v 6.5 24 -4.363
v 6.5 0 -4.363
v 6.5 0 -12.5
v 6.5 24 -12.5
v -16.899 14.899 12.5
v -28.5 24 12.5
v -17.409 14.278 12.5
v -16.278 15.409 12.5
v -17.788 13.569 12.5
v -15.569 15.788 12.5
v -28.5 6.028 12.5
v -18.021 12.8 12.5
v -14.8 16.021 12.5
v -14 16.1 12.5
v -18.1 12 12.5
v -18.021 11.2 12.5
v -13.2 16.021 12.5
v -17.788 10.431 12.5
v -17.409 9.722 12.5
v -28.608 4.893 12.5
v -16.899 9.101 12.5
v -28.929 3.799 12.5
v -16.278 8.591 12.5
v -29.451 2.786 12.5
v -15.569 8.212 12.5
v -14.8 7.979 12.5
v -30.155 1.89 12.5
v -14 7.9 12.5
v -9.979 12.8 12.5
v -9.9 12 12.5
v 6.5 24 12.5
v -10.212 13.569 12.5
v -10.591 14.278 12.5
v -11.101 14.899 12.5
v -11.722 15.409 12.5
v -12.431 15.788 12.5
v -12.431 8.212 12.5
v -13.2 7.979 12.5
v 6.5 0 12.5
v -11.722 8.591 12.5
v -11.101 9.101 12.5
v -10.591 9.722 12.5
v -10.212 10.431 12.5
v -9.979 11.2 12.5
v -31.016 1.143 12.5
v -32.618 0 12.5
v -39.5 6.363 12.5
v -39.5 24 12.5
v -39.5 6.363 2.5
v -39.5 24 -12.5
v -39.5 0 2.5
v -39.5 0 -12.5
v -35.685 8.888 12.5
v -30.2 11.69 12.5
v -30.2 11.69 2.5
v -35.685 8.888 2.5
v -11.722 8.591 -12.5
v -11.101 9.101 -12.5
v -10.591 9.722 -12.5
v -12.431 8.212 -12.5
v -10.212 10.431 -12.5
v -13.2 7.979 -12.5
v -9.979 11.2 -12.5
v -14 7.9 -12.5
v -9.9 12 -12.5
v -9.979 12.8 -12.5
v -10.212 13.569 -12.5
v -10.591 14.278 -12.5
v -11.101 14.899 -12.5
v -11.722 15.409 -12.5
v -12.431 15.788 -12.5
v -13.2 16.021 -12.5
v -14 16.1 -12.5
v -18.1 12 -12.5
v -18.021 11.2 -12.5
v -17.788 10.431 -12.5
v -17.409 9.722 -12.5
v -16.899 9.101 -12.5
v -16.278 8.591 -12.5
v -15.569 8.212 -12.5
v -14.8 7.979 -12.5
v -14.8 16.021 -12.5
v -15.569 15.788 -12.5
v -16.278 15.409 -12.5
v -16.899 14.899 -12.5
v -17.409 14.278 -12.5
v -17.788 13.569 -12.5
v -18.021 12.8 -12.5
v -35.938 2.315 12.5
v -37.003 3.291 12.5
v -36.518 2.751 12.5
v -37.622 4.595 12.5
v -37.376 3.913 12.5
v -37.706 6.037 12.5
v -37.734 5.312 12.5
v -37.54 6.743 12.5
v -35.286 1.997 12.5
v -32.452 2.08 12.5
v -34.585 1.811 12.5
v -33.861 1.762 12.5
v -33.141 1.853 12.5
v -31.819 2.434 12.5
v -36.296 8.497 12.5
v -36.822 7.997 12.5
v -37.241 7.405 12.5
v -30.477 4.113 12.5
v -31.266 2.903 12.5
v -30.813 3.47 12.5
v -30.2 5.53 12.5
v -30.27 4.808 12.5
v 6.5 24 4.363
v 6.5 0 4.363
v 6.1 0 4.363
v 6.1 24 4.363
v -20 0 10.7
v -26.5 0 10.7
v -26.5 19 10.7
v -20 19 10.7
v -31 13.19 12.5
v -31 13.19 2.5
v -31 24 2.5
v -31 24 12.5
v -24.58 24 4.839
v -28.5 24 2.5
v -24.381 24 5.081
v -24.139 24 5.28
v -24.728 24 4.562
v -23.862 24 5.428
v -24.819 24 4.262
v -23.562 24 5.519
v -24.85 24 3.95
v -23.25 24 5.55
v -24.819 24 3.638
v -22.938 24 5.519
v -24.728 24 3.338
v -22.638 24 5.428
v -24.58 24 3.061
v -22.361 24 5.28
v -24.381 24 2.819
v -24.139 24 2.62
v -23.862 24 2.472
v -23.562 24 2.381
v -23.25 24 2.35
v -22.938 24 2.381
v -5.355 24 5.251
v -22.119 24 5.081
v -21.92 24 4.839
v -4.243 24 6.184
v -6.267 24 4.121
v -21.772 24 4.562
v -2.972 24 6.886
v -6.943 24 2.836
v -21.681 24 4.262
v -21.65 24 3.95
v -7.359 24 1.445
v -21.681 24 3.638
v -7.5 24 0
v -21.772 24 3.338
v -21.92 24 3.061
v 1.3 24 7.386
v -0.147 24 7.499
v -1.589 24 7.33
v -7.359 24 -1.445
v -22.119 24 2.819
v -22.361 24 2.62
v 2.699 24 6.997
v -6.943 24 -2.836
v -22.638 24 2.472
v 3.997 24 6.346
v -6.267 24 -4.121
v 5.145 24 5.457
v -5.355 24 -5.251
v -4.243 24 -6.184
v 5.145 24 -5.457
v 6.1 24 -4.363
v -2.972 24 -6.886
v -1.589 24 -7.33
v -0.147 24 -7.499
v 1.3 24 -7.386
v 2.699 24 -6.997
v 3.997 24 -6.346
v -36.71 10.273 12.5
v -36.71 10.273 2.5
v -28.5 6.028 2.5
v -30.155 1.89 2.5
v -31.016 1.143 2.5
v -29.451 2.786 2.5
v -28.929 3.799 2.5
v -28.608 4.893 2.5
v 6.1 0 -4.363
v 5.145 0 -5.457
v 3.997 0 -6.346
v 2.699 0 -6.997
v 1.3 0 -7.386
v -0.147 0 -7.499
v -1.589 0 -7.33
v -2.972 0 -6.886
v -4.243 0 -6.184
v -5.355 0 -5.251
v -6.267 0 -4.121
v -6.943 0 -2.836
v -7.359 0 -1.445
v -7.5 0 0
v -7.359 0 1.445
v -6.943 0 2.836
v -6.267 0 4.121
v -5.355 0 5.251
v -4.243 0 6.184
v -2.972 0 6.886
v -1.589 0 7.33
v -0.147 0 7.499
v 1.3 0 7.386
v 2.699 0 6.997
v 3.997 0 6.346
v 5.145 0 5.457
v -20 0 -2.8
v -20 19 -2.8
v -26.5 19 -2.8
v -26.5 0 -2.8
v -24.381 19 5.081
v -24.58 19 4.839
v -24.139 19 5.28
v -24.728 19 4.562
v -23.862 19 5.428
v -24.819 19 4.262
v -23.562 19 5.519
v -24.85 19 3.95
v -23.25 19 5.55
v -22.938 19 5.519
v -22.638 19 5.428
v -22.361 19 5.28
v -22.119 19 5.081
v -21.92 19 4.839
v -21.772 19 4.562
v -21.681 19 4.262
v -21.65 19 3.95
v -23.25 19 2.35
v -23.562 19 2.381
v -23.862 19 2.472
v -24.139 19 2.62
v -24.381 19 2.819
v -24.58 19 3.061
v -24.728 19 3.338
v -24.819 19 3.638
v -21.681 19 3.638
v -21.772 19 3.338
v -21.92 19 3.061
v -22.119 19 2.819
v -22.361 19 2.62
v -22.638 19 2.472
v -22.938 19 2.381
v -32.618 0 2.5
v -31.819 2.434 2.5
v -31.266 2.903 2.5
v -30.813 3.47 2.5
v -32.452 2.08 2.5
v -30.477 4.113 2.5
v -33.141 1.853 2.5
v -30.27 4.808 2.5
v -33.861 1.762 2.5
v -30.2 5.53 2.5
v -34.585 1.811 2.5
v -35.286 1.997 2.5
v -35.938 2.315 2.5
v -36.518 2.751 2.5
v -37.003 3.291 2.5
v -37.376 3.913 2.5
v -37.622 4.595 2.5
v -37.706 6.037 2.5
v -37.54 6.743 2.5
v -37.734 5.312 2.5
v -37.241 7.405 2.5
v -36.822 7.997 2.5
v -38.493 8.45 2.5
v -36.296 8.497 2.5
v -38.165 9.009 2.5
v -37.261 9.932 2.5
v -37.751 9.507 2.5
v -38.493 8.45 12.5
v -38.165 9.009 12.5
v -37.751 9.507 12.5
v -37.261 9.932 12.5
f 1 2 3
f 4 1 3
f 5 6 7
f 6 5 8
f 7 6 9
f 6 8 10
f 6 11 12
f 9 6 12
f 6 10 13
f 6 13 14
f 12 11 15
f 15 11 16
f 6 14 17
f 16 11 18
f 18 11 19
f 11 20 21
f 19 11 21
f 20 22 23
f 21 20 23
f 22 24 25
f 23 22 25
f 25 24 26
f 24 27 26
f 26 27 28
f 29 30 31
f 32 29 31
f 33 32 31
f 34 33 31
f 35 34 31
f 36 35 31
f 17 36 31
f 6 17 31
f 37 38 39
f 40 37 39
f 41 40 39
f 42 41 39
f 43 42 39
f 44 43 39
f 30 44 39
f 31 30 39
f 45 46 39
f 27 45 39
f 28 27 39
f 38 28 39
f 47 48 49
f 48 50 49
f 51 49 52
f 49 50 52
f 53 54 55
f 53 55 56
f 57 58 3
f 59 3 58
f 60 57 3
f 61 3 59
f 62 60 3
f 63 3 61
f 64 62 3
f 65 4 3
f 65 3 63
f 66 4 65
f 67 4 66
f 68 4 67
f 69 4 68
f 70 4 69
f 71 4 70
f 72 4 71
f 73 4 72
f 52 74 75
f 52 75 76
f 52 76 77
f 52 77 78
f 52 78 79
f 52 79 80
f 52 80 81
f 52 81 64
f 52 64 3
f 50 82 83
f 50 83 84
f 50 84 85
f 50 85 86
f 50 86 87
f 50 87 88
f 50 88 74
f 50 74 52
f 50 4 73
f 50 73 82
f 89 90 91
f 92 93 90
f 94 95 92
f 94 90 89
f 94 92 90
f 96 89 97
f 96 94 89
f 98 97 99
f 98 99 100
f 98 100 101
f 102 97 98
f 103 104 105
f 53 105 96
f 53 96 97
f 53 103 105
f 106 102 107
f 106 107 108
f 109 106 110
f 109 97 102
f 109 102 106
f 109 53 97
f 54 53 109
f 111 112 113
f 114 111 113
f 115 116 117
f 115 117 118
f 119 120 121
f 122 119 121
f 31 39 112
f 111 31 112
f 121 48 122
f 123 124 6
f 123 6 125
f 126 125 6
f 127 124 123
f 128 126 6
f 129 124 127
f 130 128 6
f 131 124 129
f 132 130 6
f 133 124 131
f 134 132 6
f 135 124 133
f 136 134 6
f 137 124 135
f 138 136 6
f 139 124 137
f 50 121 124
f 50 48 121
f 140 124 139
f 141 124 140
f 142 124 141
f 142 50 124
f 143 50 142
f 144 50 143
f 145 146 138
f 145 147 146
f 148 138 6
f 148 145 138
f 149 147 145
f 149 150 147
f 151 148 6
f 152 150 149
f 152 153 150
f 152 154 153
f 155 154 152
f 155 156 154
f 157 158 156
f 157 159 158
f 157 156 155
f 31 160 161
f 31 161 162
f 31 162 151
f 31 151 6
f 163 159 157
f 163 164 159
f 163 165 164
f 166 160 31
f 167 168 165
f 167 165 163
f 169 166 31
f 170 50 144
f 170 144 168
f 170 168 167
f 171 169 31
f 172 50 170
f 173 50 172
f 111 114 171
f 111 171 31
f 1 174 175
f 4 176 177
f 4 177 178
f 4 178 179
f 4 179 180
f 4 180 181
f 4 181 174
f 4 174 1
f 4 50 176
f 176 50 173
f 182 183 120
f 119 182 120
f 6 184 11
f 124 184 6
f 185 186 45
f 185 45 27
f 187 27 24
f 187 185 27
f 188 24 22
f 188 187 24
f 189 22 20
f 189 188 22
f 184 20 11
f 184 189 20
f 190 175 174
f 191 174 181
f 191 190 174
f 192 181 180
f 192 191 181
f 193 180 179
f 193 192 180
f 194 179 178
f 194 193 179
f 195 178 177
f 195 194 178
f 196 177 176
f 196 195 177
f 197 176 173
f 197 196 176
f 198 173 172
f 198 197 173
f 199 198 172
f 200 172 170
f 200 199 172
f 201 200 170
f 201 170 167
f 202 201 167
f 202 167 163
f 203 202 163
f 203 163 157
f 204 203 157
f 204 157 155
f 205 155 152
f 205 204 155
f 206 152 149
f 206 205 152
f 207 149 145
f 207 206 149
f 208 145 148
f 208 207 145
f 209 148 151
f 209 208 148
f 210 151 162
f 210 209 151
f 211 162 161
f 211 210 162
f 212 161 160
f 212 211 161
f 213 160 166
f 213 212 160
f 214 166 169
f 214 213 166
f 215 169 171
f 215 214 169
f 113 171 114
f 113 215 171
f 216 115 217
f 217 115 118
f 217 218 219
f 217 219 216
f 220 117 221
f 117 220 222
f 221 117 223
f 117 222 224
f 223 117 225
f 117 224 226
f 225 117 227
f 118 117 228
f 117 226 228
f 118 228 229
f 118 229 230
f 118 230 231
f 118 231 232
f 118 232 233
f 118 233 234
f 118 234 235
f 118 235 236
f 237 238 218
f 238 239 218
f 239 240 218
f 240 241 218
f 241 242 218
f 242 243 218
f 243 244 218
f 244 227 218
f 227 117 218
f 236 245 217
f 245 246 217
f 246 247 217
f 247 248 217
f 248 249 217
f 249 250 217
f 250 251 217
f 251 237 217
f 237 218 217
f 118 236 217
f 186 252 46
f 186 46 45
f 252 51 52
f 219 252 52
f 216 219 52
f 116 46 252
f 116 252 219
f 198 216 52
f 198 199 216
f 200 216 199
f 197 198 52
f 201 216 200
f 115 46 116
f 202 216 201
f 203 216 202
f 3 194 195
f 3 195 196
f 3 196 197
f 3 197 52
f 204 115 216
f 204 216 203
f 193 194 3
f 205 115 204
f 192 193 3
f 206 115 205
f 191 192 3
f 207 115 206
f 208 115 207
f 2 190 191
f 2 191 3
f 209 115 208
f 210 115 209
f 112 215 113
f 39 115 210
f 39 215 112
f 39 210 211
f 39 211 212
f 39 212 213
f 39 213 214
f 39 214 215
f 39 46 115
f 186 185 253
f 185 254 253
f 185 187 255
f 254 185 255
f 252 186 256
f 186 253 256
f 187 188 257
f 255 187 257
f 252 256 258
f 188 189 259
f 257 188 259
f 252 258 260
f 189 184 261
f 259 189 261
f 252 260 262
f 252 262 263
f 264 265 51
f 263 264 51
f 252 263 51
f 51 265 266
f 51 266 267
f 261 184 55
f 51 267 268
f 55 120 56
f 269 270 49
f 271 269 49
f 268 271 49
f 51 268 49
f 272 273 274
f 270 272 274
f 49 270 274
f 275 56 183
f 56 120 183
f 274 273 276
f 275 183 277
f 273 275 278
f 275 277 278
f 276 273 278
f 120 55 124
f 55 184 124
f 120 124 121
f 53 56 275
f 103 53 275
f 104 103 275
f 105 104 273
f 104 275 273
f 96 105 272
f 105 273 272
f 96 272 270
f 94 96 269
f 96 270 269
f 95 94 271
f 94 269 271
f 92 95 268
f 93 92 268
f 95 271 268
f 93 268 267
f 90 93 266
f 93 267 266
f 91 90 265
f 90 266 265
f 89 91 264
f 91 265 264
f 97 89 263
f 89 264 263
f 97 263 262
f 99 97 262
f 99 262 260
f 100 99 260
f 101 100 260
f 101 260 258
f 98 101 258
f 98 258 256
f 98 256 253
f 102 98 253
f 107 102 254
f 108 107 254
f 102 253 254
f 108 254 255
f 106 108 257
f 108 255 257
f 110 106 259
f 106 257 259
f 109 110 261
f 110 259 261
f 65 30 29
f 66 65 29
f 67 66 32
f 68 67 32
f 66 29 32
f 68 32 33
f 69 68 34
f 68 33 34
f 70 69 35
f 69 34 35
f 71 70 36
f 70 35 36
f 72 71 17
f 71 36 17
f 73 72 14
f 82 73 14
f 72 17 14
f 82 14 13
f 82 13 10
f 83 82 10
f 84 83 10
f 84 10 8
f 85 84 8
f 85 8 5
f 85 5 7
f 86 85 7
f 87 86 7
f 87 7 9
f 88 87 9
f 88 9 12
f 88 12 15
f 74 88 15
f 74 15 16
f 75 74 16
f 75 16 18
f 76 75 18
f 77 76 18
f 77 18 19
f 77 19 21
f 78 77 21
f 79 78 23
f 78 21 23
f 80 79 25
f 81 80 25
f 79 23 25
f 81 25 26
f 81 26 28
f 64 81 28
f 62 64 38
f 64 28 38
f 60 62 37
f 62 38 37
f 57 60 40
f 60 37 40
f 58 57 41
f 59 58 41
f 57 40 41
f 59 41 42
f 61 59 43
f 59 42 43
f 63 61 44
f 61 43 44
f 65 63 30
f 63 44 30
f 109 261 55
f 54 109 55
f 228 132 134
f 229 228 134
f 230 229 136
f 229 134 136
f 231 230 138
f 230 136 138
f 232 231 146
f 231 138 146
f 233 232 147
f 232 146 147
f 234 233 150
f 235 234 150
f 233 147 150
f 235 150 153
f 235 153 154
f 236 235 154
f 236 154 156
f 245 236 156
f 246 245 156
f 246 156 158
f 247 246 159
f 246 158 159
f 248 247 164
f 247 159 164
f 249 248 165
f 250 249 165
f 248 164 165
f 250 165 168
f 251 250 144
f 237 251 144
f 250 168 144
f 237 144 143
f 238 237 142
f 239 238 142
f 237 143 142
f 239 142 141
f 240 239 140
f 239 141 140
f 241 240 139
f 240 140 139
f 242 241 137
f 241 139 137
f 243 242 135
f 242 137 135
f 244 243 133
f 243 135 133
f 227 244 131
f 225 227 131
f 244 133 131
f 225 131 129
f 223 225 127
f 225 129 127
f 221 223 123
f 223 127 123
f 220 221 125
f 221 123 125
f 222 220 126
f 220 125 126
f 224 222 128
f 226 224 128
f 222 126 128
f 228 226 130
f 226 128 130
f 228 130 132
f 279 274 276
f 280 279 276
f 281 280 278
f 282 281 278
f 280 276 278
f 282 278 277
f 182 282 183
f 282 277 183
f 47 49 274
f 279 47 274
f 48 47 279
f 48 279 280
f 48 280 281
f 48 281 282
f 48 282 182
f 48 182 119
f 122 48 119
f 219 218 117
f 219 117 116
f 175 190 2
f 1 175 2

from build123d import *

# Parameters (mm, degrees)
SKETCH1_W            = 22.5
SKETCH1_H            = 25
SKETCH1_R            = 7.5
BOSS_EXTRUDE1_DEPTH  = 24
CUT_EXTRUDE4_DEPTH   = 30.807717122
SKETCH7_W            = 10
SKETCH7_H            = 25
BOSS_EXTRUDE2_DEPTH  = 24
SKETCH8_R            = 4.1
CUT_EXTRUDE5_DEPTH   = 48
SKETCH135_W          = 19.5
SKETCH135_H          = 24
BOSS_EXTRUDE66_DEPTH = 15
BOSS_EXTRUDE67_DEPTH = 10
SKETCH137_W          = 6.5
SKETCH137_H          = 24
CUT_EXTRUDE6_DEPTH   = 5.3
SKETCH138_W          = 6.5
SKETCH138_H          = 1.8
BOSS_EXTRUDE68_DEPTH = 24
SKETCH139_W          = 6.5
SKETCH139_H          = 13.5
SKETCH139_R          = 1.6
BOSS_EXTRUDE69_DEPTH = 5


with BuildPart() as part:
    # Sketch1 → Boss-Extrude1 (new body)
    with BuildSketch(Plane(origin=(0, 0, 0), x_dir=(1, 0, 0), z_dir=(0, 1, 0))):
        with Locations((1.25, 0)):
            Rectangle(SKETCH1_W, SKETCH1_H)
        with Locations(Location((0, 0, 0), (0, 0, 270))):
            Circle(SKETCH1_R, mode=Mode.SUBTRACT)
    extrude(amount=BOSS_EXTRUDE1_DEPTH)

    # Sketch5 → Cut-Extrude4 (cut, through all)
    with BuildSketch(Plane.XZ):
        Polygon((12.5, 12.5), (6.5, 12.5), (6.5, 4.363484846), (6.1, 4.363484846), (6.1, -4.363484846), (6.5, -4.363484846), (6.5, -12.5), (12.5, -12.5), align=None)
    extrude(amount=-CUT_EXTRUDE4_DEPTH, mode=Mode.SUBTRACT)

    # Sketch7 → Boss-Extrude2 (add)
    with BuildSketch(Plane.XZ):
        with Locations((-15, 0)):
            Rectangle(SKETCH7_W, SKETCH7_H)
    extrude(amount=-BOSS_EXTRUDE2_DEPTH)

    # Sketch8 → Cut-Extrude5 (cut)
    with BuildSketch(Plane.XY.offset(12.5)):
        with Locations((-14, 12)):
            Circle(SKETCH8_R)
    extrude(amount=-CUT_EXTRUDE5_DEPTH, mode=Mode.SUBTRACT)

    # Sketch135 → Boss-Extrude66 (add)
    with BuildSketch(Plane(origin=(0, 0, -12.5), x_dir=(-1, 0, 0), z_dir=(0, 0, -1))):
        with Locations((29.75, 12)):
            Rectangle(SKETCH135_W, SKETCH135_H)
    extrude(amount=-BOSS_EXTRUDE66_DEPTH)

    # Sketch136 → Boss-Extrude67 (add)
    with BuildSketch(Plane.XY.offset(2.5)):
        with BuildLine():
            Line((-26.5, 0), (-30.65, 0))
            Line((-30.65, 0), (-32.618157491, 0))
            Line((-32.618157491, 0), (-31.015837104, 1.142896884))
            ThreePointArc((-31.015837104, 1.142896884), (-29.165912572, 3.280355677), (-28.5, 6.027629109))
            Line((-28.5, 6.027629109), (-28.5, 24))
            Line((-28.5, 24), (-26.5, 24))
            Line((-26.5, 24), (-26.5, 0))
        make_face()
        with BuildLine():
            Line((-31, 24), (-39.5, 24))
            Line((-39.5, 24), (-39.5, 8.68))
            Line((-39.5, 8.68), (-39.5, 6.362551494))
            Line((-39.5, 6.362551494), (-38.492686138, 8.449627525))
            ThreePointArc((-38.492686138, 8.449627525), (-37.750547948, 9.507229314), (-36.71, 10.273095232))
            Line((-36.71, 10.273095232), (-31, 13.19))
            Line((-31, 13.19), (-31, 24))
        make_face()
        with BuildLine():
            Line((-30.2, 5.530404879), (-30.2, 11.689701848))
            Line((-30.2, 11.689701848), (-35.685050881, 8.887710417))
            ThreePointArc((-35.685050881, 8.887710417), (-35.938141024, 2.314923436), (-30.2, 5.530404879))
        make_face()
    extrude(amount=BOSS_EXTRUDE67_DEPTH)

    # Sketch137 → Cut-Extrude6 (cut)
    with BuildSketch(Plane.XY.offset(2.5)):
        with Locations((-23.25, 12)):
            Rectangle(SKETCH137_W, SKETCH137_H)
    extrude(amount=-CUT_EXTRUDE6_DEPTH, mode=Mode.SUBTRACT)

    # Sketch138 → Boss-Extrude68 (add)
    with BuildSketch(Plane.XZ):
        with Locations((-23.25, 11.6)):
            Rectangle(SKETCH138_W, SKETCH138_H)
    extrude(amount=-BOSS_EXTRUDE68_DEPTH)

    # Sketch139 → Boss-Extrude69 (add)
    with BuildSketch(Plane(origin=(0, 24, 0), x_dir=(1, 0, 0), z_dir=(0, 1, 0))):
        with Locations((-23.25, -3.95)):
            Rectangle(SKETCH139_W, SKETCH139_H)
        with Locations(Location((-23.25, -3.95, 0), (0, 0, 270))):
            Circle(SKETCH139_R, mode=Mode.SUBTRACT)
    extrude(amount=-BOSS_EXTRUDE69_DEPTH)


solid = part.part
